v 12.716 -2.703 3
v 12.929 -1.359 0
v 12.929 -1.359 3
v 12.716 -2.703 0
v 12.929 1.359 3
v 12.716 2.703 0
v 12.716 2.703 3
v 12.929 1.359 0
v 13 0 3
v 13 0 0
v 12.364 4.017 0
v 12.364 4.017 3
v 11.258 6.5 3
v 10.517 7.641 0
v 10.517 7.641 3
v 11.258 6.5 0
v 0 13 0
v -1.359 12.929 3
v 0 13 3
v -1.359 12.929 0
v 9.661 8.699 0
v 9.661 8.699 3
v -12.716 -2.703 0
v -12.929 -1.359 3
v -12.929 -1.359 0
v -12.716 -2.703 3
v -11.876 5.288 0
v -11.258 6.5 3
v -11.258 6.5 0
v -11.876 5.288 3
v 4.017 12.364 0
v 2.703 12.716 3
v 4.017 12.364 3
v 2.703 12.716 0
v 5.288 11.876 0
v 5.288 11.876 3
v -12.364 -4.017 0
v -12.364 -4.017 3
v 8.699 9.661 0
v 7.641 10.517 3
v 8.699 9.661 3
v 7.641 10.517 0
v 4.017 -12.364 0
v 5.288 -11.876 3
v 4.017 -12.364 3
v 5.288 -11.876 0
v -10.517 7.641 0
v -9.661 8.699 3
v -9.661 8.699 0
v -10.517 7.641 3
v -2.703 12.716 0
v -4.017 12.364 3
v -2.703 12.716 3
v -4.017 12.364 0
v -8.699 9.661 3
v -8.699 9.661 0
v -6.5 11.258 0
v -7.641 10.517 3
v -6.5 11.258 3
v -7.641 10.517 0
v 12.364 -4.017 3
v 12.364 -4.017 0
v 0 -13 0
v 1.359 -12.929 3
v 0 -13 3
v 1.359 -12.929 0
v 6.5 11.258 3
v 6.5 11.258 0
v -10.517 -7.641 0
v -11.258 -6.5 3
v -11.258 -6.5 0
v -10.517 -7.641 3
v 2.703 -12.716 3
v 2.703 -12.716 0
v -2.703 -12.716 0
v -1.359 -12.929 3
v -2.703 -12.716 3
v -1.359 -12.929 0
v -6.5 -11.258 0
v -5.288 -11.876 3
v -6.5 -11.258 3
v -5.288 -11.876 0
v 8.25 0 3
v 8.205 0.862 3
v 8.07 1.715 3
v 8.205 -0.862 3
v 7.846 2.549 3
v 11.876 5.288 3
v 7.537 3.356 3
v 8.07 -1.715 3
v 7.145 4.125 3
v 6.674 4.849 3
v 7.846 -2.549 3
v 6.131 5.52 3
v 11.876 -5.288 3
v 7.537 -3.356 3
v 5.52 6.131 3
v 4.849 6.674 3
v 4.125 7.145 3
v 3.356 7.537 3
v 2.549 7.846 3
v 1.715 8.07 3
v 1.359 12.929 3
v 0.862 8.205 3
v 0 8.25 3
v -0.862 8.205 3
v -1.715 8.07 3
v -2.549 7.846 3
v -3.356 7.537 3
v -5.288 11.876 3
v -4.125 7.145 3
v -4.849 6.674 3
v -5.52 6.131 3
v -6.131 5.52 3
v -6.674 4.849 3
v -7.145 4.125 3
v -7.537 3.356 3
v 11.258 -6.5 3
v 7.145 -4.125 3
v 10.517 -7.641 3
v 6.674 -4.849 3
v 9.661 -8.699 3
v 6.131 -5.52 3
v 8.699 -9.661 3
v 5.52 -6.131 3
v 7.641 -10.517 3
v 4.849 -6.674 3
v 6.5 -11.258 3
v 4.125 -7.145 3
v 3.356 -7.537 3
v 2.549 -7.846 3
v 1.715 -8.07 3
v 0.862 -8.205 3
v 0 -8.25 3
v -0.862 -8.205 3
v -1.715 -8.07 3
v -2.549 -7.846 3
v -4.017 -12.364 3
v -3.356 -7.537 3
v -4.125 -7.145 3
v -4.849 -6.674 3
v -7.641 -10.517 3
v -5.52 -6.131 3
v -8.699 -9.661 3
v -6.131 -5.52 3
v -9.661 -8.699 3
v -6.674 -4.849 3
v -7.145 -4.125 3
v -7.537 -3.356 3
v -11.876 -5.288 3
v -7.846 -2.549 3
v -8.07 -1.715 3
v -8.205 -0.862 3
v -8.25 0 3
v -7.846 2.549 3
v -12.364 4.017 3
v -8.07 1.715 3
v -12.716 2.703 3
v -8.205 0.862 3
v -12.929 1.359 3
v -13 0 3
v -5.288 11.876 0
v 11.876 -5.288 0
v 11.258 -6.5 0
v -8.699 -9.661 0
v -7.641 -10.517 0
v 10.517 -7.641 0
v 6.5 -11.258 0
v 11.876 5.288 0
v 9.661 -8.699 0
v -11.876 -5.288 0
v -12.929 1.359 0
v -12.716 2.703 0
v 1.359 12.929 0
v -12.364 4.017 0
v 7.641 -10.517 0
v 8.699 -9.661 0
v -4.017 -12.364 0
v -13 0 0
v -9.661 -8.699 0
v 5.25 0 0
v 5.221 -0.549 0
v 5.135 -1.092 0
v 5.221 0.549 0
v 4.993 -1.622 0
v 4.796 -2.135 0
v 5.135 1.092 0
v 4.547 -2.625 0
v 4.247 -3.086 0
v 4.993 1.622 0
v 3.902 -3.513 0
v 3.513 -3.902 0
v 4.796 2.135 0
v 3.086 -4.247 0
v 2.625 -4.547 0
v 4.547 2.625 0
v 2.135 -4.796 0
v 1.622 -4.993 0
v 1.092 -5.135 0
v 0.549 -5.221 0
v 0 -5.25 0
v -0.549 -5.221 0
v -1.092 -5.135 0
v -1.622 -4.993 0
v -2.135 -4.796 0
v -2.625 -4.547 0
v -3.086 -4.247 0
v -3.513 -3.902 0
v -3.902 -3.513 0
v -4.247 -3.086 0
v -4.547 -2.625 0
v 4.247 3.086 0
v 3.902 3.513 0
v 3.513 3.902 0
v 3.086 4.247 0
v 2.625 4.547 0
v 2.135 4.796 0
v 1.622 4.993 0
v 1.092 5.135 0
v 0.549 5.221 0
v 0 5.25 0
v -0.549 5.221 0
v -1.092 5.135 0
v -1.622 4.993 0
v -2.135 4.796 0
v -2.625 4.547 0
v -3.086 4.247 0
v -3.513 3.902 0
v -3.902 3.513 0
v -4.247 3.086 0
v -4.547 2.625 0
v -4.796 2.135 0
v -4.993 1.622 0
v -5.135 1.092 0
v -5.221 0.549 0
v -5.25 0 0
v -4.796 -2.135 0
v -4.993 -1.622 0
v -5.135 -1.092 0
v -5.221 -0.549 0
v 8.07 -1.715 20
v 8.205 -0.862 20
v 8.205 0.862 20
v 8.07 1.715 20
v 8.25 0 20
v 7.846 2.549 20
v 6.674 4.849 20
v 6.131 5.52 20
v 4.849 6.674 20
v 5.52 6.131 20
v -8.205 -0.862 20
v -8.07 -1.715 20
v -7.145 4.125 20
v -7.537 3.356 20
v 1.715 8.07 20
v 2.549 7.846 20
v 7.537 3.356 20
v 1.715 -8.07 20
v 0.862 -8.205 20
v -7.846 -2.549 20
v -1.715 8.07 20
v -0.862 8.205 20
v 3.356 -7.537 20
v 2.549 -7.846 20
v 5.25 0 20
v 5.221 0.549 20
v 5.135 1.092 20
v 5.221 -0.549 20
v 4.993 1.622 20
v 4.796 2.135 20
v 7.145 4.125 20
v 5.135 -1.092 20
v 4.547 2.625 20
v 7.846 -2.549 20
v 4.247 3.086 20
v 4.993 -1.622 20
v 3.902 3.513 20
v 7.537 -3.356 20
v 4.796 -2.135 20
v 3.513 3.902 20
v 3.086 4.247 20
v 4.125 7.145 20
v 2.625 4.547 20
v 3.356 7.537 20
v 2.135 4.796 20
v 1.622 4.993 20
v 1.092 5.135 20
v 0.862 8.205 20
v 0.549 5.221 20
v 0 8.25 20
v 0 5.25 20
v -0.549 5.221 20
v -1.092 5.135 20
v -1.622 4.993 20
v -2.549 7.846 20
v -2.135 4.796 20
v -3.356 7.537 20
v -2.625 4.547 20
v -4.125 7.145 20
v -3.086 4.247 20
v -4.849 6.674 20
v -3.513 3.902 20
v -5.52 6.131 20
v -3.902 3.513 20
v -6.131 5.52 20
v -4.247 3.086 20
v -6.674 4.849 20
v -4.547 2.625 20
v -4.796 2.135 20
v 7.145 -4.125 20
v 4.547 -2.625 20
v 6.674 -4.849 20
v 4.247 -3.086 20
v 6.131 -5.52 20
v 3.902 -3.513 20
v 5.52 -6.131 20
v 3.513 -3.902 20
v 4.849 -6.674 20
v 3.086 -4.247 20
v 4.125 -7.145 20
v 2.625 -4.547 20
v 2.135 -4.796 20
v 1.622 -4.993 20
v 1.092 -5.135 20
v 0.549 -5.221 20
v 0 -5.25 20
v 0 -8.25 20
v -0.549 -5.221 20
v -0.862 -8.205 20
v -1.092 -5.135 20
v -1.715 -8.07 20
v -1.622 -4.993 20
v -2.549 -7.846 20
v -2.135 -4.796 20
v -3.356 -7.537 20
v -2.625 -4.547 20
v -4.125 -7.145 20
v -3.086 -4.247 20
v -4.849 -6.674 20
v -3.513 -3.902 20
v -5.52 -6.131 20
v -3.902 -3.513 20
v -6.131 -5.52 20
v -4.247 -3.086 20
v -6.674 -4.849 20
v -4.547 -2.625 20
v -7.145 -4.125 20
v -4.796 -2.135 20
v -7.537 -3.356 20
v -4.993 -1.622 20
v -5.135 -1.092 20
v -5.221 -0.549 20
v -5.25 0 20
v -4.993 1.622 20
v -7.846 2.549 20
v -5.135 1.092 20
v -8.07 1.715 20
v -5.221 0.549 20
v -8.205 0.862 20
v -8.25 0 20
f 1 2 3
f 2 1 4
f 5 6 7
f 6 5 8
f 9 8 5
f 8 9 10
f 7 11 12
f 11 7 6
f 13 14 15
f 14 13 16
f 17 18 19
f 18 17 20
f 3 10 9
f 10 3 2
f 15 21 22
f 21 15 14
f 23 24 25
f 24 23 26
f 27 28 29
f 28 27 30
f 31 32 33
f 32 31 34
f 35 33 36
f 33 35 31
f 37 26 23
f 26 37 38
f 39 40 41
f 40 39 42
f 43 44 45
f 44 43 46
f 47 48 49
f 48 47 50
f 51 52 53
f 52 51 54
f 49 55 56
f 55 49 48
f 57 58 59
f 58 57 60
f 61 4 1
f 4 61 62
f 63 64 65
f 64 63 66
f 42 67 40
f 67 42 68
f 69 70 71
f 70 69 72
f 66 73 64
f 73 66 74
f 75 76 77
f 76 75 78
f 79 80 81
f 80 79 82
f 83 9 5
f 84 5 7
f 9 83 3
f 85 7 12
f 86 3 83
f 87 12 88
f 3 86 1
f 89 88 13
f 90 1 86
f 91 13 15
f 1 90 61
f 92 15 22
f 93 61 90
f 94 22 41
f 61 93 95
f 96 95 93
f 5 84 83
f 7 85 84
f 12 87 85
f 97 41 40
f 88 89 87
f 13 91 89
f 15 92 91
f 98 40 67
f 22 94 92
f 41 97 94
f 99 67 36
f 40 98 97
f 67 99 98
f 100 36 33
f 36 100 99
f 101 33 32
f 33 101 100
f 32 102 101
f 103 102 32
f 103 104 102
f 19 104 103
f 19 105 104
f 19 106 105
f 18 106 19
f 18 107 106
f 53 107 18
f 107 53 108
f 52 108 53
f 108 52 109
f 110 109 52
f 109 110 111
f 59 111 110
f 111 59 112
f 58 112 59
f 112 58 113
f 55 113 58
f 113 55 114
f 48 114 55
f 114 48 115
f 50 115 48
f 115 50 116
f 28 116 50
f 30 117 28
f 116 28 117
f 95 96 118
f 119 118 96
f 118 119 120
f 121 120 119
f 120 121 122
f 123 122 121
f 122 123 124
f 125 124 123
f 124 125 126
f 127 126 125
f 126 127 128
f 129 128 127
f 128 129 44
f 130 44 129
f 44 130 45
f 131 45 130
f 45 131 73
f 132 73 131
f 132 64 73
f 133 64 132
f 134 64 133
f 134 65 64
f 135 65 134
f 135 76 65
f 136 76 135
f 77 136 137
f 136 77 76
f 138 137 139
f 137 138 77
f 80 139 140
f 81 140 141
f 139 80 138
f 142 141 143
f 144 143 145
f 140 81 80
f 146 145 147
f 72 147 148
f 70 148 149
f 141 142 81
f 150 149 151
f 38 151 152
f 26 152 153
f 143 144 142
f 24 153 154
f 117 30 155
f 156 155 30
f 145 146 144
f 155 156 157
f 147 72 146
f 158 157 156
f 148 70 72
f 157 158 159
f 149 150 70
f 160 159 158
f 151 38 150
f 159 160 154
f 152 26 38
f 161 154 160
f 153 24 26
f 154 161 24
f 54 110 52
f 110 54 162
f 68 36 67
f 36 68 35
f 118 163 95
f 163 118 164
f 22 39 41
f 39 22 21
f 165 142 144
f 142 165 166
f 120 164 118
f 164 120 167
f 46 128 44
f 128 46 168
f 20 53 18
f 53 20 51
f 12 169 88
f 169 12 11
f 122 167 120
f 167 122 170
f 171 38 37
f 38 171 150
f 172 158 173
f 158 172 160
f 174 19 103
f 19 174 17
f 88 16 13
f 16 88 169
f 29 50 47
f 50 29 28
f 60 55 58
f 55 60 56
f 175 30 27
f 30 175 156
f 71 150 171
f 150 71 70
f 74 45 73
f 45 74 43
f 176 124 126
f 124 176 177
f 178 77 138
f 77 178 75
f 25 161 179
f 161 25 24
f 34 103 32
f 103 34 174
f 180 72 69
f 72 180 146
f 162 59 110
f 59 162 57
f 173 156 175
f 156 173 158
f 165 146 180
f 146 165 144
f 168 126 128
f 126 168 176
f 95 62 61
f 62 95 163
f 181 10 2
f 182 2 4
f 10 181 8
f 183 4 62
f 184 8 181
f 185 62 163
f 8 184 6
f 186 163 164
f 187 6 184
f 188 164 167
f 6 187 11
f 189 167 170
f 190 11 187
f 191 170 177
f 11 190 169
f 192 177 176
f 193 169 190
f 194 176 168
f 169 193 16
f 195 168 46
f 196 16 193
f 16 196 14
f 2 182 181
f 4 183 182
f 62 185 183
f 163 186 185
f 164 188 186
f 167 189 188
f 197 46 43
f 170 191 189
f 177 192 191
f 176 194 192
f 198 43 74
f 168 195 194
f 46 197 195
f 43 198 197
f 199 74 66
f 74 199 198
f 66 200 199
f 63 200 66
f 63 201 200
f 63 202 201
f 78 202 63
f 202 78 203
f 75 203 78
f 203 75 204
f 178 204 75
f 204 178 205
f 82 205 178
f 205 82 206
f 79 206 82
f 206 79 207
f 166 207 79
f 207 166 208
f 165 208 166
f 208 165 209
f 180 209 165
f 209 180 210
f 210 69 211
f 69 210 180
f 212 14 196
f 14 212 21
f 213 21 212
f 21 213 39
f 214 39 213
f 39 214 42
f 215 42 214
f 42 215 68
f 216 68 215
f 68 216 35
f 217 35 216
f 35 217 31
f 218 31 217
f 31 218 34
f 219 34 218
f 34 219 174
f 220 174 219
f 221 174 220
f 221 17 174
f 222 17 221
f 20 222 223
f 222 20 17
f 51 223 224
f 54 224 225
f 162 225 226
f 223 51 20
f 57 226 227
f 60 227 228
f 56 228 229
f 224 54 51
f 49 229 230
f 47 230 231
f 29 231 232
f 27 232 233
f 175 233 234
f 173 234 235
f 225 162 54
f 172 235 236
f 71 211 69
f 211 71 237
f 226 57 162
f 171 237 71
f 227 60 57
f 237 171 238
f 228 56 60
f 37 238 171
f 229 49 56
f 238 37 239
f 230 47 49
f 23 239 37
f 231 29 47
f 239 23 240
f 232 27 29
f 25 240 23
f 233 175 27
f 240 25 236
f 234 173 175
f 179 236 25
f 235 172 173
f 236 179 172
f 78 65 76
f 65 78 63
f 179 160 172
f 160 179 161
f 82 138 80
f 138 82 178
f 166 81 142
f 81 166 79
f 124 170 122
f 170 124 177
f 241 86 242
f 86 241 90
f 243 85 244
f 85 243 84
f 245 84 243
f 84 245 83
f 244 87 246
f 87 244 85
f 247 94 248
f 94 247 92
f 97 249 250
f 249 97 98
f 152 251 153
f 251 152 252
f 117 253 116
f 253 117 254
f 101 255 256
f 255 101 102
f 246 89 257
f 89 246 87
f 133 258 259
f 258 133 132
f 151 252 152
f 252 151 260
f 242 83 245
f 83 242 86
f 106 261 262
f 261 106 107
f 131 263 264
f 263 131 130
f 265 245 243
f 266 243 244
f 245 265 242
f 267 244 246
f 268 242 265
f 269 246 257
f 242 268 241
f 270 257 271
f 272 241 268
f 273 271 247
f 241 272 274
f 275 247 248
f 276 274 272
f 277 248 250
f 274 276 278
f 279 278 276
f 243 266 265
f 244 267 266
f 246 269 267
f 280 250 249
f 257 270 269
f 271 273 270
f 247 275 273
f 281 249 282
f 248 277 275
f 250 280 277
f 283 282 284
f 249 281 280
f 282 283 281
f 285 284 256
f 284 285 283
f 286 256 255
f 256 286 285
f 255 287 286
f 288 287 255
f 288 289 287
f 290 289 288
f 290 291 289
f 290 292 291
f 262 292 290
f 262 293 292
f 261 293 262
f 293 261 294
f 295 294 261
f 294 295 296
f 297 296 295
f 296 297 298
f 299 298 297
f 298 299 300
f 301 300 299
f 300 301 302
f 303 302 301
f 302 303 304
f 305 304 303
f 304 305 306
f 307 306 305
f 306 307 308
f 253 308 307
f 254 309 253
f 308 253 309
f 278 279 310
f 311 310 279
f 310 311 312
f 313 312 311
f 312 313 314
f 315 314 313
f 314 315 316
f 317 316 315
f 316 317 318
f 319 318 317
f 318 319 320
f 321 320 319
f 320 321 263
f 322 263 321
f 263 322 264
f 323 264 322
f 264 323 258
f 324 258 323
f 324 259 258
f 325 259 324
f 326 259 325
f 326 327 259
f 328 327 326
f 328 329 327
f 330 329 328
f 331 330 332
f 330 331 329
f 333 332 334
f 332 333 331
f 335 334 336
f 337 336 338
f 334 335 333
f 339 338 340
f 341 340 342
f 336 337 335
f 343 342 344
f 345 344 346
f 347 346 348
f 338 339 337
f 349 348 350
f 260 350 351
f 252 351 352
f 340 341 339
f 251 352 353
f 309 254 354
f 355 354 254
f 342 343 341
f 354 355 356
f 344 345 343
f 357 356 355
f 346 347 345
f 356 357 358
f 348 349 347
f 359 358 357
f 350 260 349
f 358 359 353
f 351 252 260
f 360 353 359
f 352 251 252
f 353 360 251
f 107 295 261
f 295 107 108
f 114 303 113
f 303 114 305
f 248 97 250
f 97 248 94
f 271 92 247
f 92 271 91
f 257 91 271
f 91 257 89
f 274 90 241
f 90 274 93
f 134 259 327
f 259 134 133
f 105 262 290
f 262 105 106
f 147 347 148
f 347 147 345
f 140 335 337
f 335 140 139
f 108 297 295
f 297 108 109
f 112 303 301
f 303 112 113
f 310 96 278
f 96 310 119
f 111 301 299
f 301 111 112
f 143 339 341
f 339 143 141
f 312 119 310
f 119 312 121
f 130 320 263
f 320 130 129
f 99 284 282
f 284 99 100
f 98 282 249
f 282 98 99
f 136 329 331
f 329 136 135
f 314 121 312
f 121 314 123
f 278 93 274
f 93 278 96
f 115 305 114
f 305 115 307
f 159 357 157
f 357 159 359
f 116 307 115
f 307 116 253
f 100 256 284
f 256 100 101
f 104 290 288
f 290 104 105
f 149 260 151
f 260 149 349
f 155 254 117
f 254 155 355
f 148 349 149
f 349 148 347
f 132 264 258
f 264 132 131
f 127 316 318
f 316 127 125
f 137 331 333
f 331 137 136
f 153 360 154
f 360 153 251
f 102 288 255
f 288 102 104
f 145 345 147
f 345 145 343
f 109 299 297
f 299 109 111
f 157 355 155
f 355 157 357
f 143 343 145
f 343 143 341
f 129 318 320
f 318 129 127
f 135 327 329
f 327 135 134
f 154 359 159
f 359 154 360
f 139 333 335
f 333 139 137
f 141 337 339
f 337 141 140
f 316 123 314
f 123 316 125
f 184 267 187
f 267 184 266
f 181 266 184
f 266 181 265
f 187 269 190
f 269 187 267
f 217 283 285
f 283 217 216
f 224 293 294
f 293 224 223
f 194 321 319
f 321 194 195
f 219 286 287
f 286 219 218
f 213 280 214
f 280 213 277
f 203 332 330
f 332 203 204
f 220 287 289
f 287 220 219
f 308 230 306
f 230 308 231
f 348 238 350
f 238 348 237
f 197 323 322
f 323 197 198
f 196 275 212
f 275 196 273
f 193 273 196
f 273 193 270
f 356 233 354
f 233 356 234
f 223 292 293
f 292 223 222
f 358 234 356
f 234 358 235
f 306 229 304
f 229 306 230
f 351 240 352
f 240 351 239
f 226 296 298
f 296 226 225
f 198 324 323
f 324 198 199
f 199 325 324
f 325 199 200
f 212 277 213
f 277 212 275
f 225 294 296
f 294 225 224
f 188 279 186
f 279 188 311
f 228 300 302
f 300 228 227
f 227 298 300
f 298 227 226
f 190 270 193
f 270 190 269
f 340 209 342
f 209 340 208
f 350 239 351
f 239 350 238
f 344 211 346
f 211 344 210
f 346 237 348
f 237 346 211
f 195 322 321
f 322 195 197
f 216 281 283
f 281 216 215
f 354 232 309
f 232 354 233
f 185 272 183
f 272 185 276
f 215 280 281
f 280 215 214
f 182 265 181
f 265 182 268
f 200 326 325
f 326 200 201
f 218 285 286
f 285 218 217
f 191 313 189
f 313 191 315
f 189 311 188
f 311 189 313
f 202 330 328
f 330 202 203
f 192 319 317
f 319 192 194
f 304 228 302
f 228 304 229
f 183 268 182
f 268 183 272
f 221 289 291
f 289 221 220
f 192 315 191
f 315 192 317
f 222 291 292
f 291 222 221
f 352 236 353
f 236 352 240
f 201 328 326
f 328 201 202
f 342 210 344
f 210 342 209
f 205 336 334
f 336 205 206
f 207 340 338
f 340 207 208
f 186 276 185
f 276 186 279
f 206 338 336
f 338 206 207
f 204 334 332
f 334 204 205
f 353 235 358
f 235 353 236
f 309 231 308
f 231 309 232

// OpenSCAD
// Threaded mounting boss.
$fn = 60;
eps = 0.02;
thread_d = 10.5;
base_d = 26;
height = 20;
difference() { union() { cylinder(d=base_d,h=3); cylinder(d=thread_d+6,h=height); } translate([0,0,-eps]) cylinder(d=thread_d,h=height+2*eps); }
